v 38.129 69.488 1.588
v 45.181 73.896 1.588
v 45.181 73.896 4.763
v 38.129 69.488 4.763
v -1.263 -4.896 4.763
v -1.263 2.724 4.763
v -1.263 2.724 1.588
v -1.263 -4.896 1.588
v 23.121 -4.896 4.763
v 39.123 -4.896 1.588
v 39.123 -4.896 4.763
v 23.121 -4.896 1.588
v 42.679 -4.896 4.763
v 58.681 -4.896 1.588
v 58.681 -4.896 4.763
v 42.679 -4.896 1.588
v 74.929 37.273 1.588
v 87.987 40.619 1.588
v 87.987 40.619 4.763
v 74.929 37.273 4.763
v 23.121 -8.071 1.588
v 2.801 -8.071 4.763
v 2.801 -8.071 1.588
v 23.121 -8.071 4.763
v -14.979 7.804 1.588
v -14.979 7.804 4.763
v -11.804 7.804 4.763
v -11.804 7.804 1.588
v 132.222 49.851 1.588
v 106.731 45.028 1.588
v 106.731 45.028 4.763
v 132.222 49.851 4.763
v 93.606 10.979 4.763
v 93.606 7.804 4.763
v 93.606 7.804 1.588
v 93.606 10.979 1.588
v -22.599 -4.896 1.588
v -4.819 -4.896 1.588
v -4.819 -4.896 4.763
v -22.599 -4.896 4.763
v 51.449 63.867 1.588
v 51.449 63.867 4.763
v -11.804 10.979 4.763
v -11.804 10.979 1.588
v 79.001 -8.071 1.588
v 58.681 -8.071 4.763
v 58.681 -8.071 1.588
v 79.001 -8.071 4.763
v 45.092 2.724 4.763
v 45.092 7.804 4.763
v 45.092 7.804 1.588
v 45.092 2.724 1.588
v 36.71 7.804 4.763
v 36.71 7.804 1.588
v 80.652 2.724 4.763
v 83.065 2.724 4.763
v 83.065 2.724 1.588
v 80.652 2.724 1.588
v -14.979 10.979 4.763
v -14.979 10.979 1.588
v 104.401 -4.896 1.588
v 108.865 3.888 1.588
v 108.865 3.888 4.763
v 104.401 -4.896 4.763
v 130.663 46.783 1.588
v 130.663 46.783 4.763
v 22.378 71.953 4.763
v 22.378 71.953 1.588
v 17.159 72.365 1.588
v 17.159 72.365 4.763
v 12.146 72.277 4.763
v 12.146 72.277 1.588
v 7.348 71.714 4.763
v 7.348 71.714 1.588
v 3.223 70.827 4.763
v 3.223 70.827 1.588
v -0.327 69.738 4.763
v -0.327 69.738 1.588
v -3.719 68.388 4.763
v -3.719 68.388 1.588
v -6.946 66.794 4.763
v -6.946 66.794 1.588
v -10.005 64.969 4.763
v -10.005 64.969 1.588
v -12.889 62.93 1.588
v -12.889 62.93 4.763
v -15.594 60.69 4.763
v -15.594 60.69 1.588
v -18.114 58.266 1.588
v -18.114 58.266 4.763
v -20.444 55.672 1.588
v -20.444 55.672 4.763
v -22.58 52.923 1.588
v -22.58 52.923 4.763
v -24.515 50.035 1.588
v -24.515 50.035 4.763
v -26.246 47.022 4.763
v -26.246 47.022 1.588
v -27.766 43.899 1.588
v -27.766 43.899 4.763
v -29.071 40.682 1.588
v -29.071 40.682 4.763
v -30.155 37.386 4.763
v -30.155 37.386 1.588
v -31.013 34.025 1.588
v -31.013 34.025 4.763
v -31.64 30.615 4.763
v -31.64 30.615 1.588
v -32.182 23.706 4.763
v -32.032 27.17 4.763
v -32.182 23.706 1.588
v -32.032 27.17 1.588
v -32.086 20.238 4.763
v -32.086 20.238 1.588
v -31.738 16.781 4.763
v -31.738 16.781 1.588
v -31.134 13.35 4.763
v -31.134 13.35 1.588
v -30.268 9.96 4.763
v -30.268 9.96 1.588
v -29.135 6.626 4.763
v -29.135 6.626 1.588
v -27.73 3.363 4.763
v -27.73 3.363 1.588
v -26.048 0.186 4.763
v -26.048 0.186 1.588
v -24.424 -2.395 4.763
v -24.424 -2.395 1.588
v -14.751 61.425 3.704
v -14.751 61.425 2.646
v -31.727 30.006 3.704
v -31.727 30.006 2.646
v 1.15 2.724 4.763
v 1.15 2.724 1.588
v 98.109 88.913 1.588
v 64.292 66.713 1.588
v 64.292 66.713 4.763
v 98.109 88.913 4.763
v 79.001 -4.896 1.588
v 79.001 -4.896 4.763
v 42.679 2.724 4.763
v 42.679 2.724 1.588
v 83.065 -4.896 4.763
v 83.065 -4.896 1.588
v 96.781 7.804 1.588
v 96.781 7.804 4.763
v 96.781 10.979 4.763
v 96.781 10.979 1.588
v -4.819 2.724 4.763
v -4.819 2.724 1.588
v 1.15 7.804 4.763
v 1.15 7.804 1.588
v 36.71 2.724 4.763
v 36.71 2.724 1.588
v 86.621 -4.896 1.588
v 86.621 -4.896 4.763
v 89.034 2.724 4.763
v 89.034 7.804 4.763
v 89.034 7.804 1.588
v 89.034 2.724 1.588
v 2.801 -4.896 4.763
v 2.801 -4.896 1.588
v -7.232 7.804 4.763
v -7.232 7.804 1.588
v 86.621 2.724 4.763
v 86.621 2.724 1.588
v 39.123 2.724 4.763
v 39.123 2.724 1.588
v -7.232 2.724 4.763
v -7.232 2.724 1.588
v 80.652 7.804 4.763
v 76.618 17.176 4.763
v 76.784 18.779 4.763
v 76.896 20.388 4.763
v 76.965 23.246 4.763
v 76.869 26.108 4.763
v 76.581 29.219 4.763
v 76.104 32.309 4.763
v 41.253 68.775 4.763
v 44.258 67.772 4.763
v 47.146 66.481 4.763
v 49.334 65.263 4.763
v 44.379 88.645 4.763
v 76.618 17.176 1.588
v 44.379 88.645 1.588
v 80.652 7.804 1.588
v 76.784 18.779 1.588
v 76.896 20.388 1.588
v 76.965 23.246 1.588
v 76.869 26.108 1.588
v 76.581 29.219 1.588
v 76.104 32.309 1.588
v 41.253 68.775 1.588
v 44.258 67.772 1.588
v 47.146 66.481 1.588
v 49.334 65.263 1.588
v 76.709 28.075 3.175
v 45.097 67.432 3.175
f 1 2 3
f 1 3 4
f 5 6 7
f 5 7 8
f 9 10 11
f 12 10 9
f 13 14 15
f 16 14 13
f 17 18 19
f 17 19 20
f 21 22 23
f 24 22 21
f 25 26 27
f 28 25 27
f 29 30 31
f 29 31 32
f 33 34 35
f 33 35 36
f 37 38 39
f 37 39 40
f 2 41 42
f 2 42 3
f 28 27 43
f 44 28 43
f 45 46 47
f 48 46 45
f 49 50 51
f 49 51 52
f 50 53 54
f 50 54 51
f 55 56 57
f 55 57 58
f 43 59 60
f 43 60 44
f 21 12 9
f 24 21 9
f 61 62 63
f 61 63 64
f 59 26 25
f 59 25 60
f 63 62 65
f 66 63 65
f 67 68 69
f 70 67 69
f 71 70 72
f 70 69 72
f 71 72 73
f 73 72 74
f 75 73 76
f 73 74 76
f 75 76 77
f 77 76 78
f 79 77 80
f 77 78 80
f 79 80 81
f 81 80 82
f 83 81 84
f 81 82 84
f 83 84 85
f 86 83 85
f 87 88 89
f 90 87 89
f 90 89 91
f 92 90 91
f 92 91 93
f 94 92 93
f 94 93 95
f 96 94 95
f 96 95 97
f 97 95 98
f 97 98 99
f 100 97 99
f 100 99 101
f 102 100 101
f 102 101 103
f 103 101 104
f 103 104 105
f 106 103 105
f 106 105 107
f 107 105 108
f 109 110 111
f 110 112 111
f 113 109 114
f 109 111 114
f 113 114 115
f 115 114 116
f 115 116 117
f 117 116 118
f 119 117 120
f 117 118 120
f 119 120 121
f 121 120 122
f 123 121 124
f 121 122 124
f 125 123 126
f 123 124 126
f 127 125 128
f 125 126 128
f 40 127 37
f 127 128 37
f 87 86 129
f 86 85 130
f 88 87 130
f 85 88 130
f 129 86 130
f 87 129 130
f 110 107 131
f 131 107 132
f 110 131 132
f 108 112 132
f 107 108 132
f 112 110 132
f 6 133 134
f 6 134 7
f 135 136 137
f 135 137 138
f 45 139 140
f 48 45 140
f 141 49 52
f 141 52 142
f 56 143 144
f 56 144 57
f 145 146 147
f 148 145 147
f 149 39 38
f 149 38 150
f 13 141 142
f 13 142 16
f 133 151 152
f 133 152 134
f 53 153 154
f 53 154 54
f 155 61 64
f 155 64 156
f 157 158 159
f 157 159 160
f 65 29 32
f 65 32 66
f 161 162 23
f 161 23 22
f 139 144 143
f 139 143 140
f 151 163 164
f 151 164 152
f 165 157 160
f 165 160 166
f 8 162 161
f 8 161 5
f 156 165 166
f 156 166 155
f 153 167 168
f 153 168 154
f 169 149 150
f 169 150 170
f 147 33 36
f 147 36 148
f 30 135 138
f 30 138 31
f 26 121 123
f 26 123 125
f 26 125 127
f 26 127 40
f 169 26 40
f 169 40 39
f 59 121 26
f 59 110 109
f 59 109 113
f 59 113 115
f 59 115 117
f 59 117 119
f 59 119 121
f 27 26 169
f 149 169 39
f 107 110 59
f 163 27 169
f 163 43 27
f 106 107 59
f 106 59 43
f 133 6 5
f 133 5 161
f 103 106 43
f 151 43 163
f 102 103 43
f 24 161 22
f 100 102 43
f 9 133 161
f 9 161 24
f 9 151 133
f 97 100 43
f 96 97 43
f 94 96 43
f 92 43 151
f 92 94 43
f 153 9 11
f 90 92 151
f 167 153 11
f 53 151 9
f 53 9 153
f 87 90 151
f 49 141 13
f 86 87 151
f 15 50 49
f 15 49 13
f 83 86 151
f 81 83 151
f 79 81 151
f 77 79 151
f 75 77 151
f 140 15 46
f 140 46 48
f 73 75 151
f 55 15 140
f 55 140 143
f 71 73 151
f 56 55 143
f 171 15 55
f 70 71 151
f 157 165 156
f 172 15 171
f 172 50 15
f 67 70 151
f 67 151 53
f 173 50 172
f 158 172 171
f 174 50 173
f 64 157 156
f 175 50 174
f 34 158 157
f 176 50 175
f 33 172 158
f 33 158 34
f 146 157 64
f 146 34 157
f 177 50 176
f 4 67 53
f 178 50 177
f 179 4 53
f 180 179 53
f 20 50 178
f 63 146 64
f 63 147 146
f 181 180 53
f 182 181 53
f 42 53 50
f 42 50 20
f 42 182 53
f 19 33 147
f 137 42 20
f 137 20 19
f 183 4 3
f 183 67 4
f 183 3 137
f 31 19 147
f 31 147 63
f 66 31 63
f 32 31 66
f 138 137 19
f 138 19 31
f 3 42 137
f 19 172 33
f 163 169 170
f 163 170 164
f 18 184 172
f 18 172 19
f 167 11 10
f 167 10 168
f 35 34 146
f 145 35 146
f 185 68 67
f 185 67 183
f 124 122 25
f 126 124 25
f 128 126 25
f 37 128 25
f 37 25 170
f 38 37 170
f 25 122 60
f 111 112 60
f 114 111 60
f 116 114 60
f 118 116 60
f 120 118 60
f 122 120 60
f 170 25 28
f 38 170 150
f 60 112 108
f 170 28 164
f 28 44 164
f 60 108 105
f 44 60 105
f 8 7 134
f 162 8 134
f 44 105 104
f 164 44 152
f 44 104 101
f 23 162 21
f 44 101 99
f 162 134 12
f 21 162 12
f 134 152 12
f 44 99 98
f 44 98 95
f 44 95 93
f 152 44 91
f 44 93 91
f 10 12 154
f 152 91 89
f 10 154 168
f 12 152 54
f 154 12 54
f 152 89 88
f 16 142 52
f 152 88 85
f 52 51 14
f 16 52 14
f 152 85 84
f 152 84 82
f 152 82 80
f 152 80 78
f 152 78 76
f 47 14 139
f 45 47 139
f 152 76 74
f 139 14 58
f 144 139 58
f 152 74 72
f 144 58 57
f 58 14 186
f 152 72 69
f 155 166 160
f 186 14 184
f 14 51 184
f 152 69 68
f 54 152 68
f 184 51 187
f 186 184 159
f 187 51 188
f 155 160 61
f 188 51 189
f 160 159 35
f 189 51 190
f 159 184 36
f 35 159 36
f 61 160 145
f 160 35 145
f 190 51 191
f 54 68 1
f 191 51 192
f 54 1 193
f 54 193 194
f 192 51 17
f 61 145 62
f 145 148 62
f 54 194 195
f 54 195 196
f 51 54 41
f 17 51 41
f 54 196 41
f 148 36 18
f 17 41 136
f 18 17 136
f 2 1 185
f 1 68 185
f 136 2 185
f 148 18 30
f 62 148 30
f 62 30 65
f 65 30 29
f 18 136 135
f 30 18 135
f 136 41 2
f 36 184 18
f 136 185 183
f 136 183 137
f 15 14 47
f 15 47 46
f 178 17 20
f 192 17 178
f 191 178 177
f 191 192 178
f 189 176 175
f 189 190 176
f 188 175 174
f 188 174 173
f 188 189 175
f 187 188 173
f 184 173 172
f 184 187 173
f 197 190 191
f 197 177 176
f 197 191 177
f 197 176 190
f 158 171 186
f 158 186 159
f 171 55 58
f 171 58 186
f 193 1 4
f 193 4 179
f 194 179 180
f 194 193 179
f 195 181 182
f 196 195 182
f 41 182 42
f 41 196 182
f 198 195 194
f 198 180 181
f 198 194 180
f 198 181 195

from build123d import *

# Parameters (mm, degrees)
BOSS_EXTRUDE2_DEPTH = 6.35
SCALE1_DEPTH        = 6.35
SCALE1_2_DEPTH      = 1.587500269
SCALE1_START        = 4.762500269
SCALE1_3_DEPTH      = 1.587499731
SCALE1_START_2      = 1.587500269
SCALE1_4_DEPTH      = 3.175
SKETCH2_W           = 3.175
SKETCH2_H           = 3.175
CUT_EXTRUDE2_DEPTH  = 3.175
SKETCH3_W           = 20.32
SKETCH3_H           = 3.175
BOSS_EXTRUDE3_DEPTH = 3.175
CUT_EXTRUDE3_DEPTH  = 3.175


# Read off the part's stored shape, not the designer's step: Scale1
with BuildPart() as part:
    # Sketch1 → Boss-Extrude2 (new body)
    with BuildSketch(Plane.XY):
        with BuildLine():
            Line((83.827808052, -44.105116896), (-89.955824252, -44.105116896))
            add(Edge.make_bspline(
                [(-89.955824252, -44.105116896), (-138.279146298, 17.577773588), (-90.448185334, 121.033367978), (0, 109.592549188)],
                knots=[0, 0, 0, 0, 1, 1, 1, 1], degree=3))
            Line((0, 109.592549188), (44.001127073, 142.976601592))
            Line((44.001127073, 142.976601592), (83.827808052, 99.113432677))
            Line((83.827808052, 99.113432677), (151.46035168, 143.51342315))
            Line((151.46035168, 143.51342315), (168.705700605, 55.742873106))
            Line((168.705700605, 55.742873106), (219.688100022, 65.389167163))
            Line((219.688100022, 65.389167163), (164.044175748, -44.105116896))
            Line((164.044175748, -44.105116896), (83.827808052, -44.105116896))
        make_face()
        with BuildLine():
            Line((108.479325939, 0.038399309), (131.217832103, 46.925099923))
            Line((131.217832103, 46.925099923), (105.101551368, 40.233461811))
            add(Edge.make_bspline(
                [(108.479325939, 0.038399309), (109.348375822, 7.243418902), (109.431703621, 20.845994783), (106.837891987, 34.226883905), (105.101551368, 40.233461811)],
                knots=[0.221169561, 0.221169561, 0.221169561, 0.221169561, 0.320684156, 0.405876818, 0.405876818, 0.405876818, 0.405876818], degree=3))
        make_face(mode=Mode.SUBTRACT)
        with BuildLine():
            Line((31.501577026, 104.663344036), (45.60523641, 113.478131151))
            Line((45.60523641, 113.478131151), (58.141193688, 93.420599506))
            add(Edge.make_bspline(
                [(58.141193688, 93.420599506), (46.052907541, 102.061530026), (31.501577026, 104.663344036)],
                knots=[0, 0, 0, 1, 1, 1], degree=2))
        make_face(mode=Mode.SUBTRACT)
    extrude(amount=BOSS_EXTRUDE2_DEPTH)

    # Scale1 outline → Scale1 (cut)
    # profile 1 of 3: a face of its own
    with BuildSketch(Plane.XY):
        with BuildLine():
            Line((44.001127073, 142.976601592), (0, 109.592549188))
            add(Edge.make_bspline(
                [(0, 109.592549188), (-90.448185334, 121.033367978), (-138.279146298, 17.577773588), (-89.955824252, -44.105116896)],
                knots=[0, 0, 0, 0, 1, 1, 1, 1], degree=3))
            Line((-89.955824252, -44.105116896), (164.044175748, -44.105116896))
            Line((164.044175748, -44.105116896), (219.688100022, 65.389167163))
            Line((219.688100022, 65.389167163), (168.705700605, 55.742873106))
            Line((168.705700605, 55.742873106), (151.46035168, 143.51342315))
            Line((151.46035168, 143.51342315), (83.827808052, 99.113432677))
            Line((83.827808052, 99.113432677), (44.001127073, 142.976601592))
        make_face()
        with BuildLine():
            add(Edge.make_bspline(
                [(22.378427384, 71.952774895), (-22.845665283, 77.67318429), (-46.761145765, 25.945387095), (-22.599484742, -4.896058147)],
                knots=[0, 0, 0, 0, 1, 1, 1, 1], degree=3))
            Line((22.378427384, 71.952774895), (44.378990921, 88.644801097))
            Line((44.378990921, 88.644801097), (64.29233141, 66.713216639))
            Line((64.29233141, 66.713216639), (98.108603224, 88.913211876))
            Line((98.108603224, 88.913211876), (106.731277687, 45.027936854))
            Line((106.731277687, 45.027936854), (132.222477396, 49.851083882))
            Line((132.222477396, 49.851083882), (130.663317047, 46.783019429))
            Line((130.663317047, 46.783019429), (131.217832103, 46.925099923))
            Line((131.217832103, 46.925099923), (108.479325939, 0.038399309))
            add(Edge.make_bspline(
                [(108.864671926, 3.888362517), (108.762049288, 2.601843236), (108.633688525, 1.318171025), (108.479325939, 0.038399309)],
                knots=[0.388200813, 0.388200813, 0.388200813, 0.388200813, 0.405876818, 0.405876818, 0.405876818, 0.405876818], degree=3))
            Line((108.864671926, 3.888362517), (104.400515258, -4.896058147))
            Line((104.400515258, -4.896058147), (-22.599484742, -4.896058147))
        make_face(mode=Mode.SUBTRACT)
        with BuildLine():
            add(Edge.make_bspline(
                [(31.501577026, 104.663344036), (46.052907541, 102.061530026), (58.141193688, 93.420599506)],
                knots=[0, 0, 0, 1, 1, 1], degree=2))
            Line((31.501577026, 104.663344036), (45.60523641, 113.478131151))
            Line((45.60523641, 113.478131151), (58.141193688, 93.420599506))
        make_face(mode=Mode.SUBTRACT)
    # profile 2 of 3: a face of its own
    with BuildSketch(Plane.XY):
        with BuildLine():
            Line((45.18104559, 73.895565876), (38.129215897, 69.488172319))
            add(Edge.make_bspline(
                [(38.129215897, 69.488172319), (45.404881155, 68.187265314), (51.449024229, 63.866800054)],
                knots=[0, 0, 0, 1, 1, 1], degree=2))
            Line((51.449024229, 63.866800054), (45.18104559, 73.895565876))
        make_face()
    # profile 3 of 3: a face of its own
    with BuildSketch(Plane.XY):
        with BuildLine():
            Line((87.987343436, 40.619050262), (74.929203069, 37.273231206))
            add(Edge.make_bspline(
                [(74.929203069, 37.273231206), (75.797373378, 34.269942253), (77.094279195, 27.579497692), (77.052615295, 20.778209752), (76.618090354, 17.175699955)],
                knots=[0.221169561, 0.221169561, 0.221169561, 0.221169561, 0.306362223, 0.405876818, 0.405876818, 0.405876818, 0.405876818], degree=3))
            Line((76.618090354, 17.175699955), (87.987343436, 40.619050262))
        make_face()
    extrude(amount=SCALE1_DEPTH, mode=Mode.SUBTRACT)

    # Scale1 2 outline → Scale1 2 (cut)
    with BuildSketch(Plane.XY):
        with BuildLine():
            Line((44.378990921, 88.644801097), (22.378427384, 71.952774895))
            add(Edge.make_bspline(
                [(22.378427384, 71.952774895), (-22.845665283, 77.67318429), (-46.761145765, 25.945387095), (-22.599484742, -4.896058147)],
                knots=[0, 0, 0, 0, 1, 1, 1, 1], degree=3))
            Line((-22.599484742, -4.896058147), (104.400515258, -4.896058147))
            Line((104.400515258, -4.896058147), (108.864671926, 3.888362517))
            add(Edge.make_bspline(
                [(105.101551368, 40.233461811), (106.837891987, 34.226883905), (109.183482579, 22.126511148), (109.339807105, 9.844851123), (108.864671926, 3.888362517)],
                knots=[0.221169561, 0.221169561, 0.221169561, 0.221169561, 0.306362223, 0.388200813, 0.388200813, 0.388200813, 0.388200813], degree=3))
            Line((105.101551368, 40.233461811), (130.663317047, 46.783019429))
            Line((130.663317047, 46.783019429), (132.222477396, 49.851083882))
            Line((132.222477396, 49.851083882), (106.731277687, 45.027936854))
            Line((106.731277687, 45.027936854), (98.108603224, 88.913211876))
            Line((98.108603224, 88.913211876), (64.29233141, 66.713216639))
            Line((64.29233141, 66.713216639), (44.378990921, 88.644801097))
        make_face()
        with BuildLine():
            add(Edge.make_bspline(
                [(74.929203069, 37.273231206), (75.797373378, 34.269942253), (77.094279195, 27.579497692), (77.052615295, 20.778209752), (76.618090354, 17.175699955)],
                knots=[0.221169561, 0.221169561, 0.221169561, 0.221169561, 0.306362223, 0.405876818, 0.405876818, 0.405876818, 0.405876818], degree=3))
            Line((74.929203069, 37.273231206), (87.987343436, 40.619050262))
            Line((87.987343436, 40.619050262), (76.618090354, 17.175699955))
        make_face(mode=Mode.SUBTRACT)
        with BuildLine():
            add(Edge.make_bspline(
                [(38.129215897, 69.488172319), (45.404881155, 68.187265314), (51.449024229, 63.866800054)],
                knots=[0, 0, 0, 1, 1, 1], degree=2))
            Line((38.129215897, 69.488172319), (45.18104559, 73.895565876))
            Line((45.18104559, 73.895565876), (51.449024229, 63.866800054))
        make_face(mode=Mode.SUBTRACT)
    extrude(amount=SCALE1_2_DEPTH, mode=Mode.SUBTRACT)

    # Scale1 3 outline → Scale1 3 (cut)
    with BuildSketch(Plane.XY.offset(SCALE1_START)):
        with BuildLine():
            Line((44.378990921, 88.644801097), (22.378427384, 71.952774895))
            add(Edge.make_bspline(
                [(22.378427384, 71.952774895), (-22.845665283, 77.67318429), (-46.761145765, 25.945387095), (-22.599484742, -4.896058147)],
                knots=[0, 0, 0, 0, 1, 1, 1, 1], degree=3))
            Line((-22.599484742, -4.896058147), (104.400515258, -4.896058147))
            Line((104.400515258, -4.896058147), (108.864671926, 3.888362517))
            add(Edge.make_bspline(
                [(105.101551368, 40.233461811), (106.837891987, 34.226883905), (109.183482579, 22.126511148), (109.339807105, 9.844851123), (108.864671926, 3.888362517)],
                knots=[0.221169561, 0.221169561, 0.221169561, 0.221169561, 0.306362223, 0.388200813, 0.388200813, 0.388200813, 0.388200813], degree=3))
            Line((105.101551368, 40.233461811), (130.663317047, 46.783019429))
            Line((130.663317047, 46.783019429), (132.222477396, 49.851083882))
            Line((132.222477396, 49.851083882), (106.731277687, 45.027936854))
            Line((106.731277687, 45.027936854), (98.108603224, 88.913211876))
            Line((98.108603224, 88.913211876), (64.29233141, 66.713216639))
            Line((64.29233141, 66.713216639), (44.378990921, 88.644801097))
        make_face()
        with BuildLine():
            add(Edge.make_bspline(
                [(74.929203069, 37.273231206), (75.797373378, 34.269942253), (77.094279195, 27.579497692), (77.052615295, 20.778209752), (76.618090354, 17.175699955)],
                knots=[0.221169561, 0.221169561, 0.221169561, 0.221169561, 0.306362223, 0.405876818, 0.405876818, 0.405876818, 0.405876818], degree=3))
            Line((74.929203069, 37.273231206), (87.987343436, 40.619050262))
            Line((87.987343436, 40.619050262), (76.618090354, 17.175699955))
        make_face(mode=Mode.SUBTRACT)
        with BuildLine():
            add(Edge.make_bspline(
                [(38.129215897, 69.488172319), (45.404881155, 68.187265314), (51.449024229, 63.866800054)],
                knots=[0, 0, 0, 1, 1, 1], degree=2))
            Line((38.129215897, 69.488172319), (45.18104559, 73.895565876))
            Line((45.18104559, 73.895565876), (51.449024229, 63.866800054))
        make_face(mode=Mode.SUBTRACT)
    extrude(amount=SCALE1_3_DEPTH, mode=Mode.SUBTRACT)

    # Scale1 4 outline → Scale1 4 (add)
    with BuildSketch(Plane.XY.offset(SCALE1_START_2)):
        with BuildLine():
            add(Edge.make_bspline(
                [(105.101551368, 40.233461811), (106.837891987, 34.226883905), (109.183482579, 22.126511148), (109.339807105, 9.844851123), (108.864671926, 3.888362517)],
                knots=[0.221169561, 0.221169561, 0.221169561, 0.221169561, 0.306362223, 0.388200813, 0.388200813, 0.388200813, 0.388200813], degree=3))
            Line((108.864671926, 3.888362517), (130.663317047, 46.783019429))
            Line((130.663317047, 46.783019429), (105.101551368, 40.233461811))
        make_face()
    extrude(amount=SCALE1_4_DEPTH)

    # Sketch2 → Cut-Extrude2 (cut)
    with BuildSketch(Plane.XY.offset(4.762500269)):
        with Locations((-13.391984742, 9.391441853)):
            Rectangle(SKETCH2_W, SKETCH2_H)
        with Locations((95.193015258, 9.391441853)):
            Rectangle(SKETCH2_W, SKETCH2_H)
    extrude(amount=-CUT_EXTRUDE2_DEPTH, mode=Mode.SUBTRACT)

    # Sketch3 → Boss-Extrude3 (add)
    with BuildSketch(Plane.XZ.offset(4.896058147)):
        with Locations((12.960515258, 3.175000269)):
            Rectangle(SKETCH3_W, SKETCH3_H)
        with Locations((68.840515258, 3.175000269)):
            Rectangle(SKETCH3_W, SKETCH3_H)
    extrude(amount=BOSS_EXTRUDE3_DEPTH)

    # Sketch4 → Cut-Extrude3 (cut)
    with BuildSketch(Plane.XY.offset(4.762500269)):
        Polygon((-7.232484742, 7.803941853), (1.149515258, 7.803941853), (1.149515258, 2.723941853), (-1.263484742, 2.723941853), (-1.263484742, -4.896058147), (-4.819484742, -4.896058147), (-4.819484742, 2.723941853), (-7.232484742, 2.723941853), align=None)
        Polygon((36.709515258, 7.803941853), (45.091515258, 7.803941853), (45.091515258, 2.723941853), (42.678515258, 2.723941853), (42.678515258, -4.896058147), (39.122515258, -4.896058147), (39.122515258, 2.723941853), (36.709515258, 2.723941853), align=None)
        Polygon((80.651515258, 7.803941853), (89.033515258, 7.803941853), (89.033515258, 2.723941853), (86.620515258, 2.723941853), (86.620515258, -4.896058147), (83.064515258, -4.896058147), (83.064515258, 2.723941853), (80.651515258, 2.723941853), align=None)
    extrude(amount=-CUT_EXTRUDE3_DEPTH, mode=Mode.SUBTRACT)


solid = part.part
